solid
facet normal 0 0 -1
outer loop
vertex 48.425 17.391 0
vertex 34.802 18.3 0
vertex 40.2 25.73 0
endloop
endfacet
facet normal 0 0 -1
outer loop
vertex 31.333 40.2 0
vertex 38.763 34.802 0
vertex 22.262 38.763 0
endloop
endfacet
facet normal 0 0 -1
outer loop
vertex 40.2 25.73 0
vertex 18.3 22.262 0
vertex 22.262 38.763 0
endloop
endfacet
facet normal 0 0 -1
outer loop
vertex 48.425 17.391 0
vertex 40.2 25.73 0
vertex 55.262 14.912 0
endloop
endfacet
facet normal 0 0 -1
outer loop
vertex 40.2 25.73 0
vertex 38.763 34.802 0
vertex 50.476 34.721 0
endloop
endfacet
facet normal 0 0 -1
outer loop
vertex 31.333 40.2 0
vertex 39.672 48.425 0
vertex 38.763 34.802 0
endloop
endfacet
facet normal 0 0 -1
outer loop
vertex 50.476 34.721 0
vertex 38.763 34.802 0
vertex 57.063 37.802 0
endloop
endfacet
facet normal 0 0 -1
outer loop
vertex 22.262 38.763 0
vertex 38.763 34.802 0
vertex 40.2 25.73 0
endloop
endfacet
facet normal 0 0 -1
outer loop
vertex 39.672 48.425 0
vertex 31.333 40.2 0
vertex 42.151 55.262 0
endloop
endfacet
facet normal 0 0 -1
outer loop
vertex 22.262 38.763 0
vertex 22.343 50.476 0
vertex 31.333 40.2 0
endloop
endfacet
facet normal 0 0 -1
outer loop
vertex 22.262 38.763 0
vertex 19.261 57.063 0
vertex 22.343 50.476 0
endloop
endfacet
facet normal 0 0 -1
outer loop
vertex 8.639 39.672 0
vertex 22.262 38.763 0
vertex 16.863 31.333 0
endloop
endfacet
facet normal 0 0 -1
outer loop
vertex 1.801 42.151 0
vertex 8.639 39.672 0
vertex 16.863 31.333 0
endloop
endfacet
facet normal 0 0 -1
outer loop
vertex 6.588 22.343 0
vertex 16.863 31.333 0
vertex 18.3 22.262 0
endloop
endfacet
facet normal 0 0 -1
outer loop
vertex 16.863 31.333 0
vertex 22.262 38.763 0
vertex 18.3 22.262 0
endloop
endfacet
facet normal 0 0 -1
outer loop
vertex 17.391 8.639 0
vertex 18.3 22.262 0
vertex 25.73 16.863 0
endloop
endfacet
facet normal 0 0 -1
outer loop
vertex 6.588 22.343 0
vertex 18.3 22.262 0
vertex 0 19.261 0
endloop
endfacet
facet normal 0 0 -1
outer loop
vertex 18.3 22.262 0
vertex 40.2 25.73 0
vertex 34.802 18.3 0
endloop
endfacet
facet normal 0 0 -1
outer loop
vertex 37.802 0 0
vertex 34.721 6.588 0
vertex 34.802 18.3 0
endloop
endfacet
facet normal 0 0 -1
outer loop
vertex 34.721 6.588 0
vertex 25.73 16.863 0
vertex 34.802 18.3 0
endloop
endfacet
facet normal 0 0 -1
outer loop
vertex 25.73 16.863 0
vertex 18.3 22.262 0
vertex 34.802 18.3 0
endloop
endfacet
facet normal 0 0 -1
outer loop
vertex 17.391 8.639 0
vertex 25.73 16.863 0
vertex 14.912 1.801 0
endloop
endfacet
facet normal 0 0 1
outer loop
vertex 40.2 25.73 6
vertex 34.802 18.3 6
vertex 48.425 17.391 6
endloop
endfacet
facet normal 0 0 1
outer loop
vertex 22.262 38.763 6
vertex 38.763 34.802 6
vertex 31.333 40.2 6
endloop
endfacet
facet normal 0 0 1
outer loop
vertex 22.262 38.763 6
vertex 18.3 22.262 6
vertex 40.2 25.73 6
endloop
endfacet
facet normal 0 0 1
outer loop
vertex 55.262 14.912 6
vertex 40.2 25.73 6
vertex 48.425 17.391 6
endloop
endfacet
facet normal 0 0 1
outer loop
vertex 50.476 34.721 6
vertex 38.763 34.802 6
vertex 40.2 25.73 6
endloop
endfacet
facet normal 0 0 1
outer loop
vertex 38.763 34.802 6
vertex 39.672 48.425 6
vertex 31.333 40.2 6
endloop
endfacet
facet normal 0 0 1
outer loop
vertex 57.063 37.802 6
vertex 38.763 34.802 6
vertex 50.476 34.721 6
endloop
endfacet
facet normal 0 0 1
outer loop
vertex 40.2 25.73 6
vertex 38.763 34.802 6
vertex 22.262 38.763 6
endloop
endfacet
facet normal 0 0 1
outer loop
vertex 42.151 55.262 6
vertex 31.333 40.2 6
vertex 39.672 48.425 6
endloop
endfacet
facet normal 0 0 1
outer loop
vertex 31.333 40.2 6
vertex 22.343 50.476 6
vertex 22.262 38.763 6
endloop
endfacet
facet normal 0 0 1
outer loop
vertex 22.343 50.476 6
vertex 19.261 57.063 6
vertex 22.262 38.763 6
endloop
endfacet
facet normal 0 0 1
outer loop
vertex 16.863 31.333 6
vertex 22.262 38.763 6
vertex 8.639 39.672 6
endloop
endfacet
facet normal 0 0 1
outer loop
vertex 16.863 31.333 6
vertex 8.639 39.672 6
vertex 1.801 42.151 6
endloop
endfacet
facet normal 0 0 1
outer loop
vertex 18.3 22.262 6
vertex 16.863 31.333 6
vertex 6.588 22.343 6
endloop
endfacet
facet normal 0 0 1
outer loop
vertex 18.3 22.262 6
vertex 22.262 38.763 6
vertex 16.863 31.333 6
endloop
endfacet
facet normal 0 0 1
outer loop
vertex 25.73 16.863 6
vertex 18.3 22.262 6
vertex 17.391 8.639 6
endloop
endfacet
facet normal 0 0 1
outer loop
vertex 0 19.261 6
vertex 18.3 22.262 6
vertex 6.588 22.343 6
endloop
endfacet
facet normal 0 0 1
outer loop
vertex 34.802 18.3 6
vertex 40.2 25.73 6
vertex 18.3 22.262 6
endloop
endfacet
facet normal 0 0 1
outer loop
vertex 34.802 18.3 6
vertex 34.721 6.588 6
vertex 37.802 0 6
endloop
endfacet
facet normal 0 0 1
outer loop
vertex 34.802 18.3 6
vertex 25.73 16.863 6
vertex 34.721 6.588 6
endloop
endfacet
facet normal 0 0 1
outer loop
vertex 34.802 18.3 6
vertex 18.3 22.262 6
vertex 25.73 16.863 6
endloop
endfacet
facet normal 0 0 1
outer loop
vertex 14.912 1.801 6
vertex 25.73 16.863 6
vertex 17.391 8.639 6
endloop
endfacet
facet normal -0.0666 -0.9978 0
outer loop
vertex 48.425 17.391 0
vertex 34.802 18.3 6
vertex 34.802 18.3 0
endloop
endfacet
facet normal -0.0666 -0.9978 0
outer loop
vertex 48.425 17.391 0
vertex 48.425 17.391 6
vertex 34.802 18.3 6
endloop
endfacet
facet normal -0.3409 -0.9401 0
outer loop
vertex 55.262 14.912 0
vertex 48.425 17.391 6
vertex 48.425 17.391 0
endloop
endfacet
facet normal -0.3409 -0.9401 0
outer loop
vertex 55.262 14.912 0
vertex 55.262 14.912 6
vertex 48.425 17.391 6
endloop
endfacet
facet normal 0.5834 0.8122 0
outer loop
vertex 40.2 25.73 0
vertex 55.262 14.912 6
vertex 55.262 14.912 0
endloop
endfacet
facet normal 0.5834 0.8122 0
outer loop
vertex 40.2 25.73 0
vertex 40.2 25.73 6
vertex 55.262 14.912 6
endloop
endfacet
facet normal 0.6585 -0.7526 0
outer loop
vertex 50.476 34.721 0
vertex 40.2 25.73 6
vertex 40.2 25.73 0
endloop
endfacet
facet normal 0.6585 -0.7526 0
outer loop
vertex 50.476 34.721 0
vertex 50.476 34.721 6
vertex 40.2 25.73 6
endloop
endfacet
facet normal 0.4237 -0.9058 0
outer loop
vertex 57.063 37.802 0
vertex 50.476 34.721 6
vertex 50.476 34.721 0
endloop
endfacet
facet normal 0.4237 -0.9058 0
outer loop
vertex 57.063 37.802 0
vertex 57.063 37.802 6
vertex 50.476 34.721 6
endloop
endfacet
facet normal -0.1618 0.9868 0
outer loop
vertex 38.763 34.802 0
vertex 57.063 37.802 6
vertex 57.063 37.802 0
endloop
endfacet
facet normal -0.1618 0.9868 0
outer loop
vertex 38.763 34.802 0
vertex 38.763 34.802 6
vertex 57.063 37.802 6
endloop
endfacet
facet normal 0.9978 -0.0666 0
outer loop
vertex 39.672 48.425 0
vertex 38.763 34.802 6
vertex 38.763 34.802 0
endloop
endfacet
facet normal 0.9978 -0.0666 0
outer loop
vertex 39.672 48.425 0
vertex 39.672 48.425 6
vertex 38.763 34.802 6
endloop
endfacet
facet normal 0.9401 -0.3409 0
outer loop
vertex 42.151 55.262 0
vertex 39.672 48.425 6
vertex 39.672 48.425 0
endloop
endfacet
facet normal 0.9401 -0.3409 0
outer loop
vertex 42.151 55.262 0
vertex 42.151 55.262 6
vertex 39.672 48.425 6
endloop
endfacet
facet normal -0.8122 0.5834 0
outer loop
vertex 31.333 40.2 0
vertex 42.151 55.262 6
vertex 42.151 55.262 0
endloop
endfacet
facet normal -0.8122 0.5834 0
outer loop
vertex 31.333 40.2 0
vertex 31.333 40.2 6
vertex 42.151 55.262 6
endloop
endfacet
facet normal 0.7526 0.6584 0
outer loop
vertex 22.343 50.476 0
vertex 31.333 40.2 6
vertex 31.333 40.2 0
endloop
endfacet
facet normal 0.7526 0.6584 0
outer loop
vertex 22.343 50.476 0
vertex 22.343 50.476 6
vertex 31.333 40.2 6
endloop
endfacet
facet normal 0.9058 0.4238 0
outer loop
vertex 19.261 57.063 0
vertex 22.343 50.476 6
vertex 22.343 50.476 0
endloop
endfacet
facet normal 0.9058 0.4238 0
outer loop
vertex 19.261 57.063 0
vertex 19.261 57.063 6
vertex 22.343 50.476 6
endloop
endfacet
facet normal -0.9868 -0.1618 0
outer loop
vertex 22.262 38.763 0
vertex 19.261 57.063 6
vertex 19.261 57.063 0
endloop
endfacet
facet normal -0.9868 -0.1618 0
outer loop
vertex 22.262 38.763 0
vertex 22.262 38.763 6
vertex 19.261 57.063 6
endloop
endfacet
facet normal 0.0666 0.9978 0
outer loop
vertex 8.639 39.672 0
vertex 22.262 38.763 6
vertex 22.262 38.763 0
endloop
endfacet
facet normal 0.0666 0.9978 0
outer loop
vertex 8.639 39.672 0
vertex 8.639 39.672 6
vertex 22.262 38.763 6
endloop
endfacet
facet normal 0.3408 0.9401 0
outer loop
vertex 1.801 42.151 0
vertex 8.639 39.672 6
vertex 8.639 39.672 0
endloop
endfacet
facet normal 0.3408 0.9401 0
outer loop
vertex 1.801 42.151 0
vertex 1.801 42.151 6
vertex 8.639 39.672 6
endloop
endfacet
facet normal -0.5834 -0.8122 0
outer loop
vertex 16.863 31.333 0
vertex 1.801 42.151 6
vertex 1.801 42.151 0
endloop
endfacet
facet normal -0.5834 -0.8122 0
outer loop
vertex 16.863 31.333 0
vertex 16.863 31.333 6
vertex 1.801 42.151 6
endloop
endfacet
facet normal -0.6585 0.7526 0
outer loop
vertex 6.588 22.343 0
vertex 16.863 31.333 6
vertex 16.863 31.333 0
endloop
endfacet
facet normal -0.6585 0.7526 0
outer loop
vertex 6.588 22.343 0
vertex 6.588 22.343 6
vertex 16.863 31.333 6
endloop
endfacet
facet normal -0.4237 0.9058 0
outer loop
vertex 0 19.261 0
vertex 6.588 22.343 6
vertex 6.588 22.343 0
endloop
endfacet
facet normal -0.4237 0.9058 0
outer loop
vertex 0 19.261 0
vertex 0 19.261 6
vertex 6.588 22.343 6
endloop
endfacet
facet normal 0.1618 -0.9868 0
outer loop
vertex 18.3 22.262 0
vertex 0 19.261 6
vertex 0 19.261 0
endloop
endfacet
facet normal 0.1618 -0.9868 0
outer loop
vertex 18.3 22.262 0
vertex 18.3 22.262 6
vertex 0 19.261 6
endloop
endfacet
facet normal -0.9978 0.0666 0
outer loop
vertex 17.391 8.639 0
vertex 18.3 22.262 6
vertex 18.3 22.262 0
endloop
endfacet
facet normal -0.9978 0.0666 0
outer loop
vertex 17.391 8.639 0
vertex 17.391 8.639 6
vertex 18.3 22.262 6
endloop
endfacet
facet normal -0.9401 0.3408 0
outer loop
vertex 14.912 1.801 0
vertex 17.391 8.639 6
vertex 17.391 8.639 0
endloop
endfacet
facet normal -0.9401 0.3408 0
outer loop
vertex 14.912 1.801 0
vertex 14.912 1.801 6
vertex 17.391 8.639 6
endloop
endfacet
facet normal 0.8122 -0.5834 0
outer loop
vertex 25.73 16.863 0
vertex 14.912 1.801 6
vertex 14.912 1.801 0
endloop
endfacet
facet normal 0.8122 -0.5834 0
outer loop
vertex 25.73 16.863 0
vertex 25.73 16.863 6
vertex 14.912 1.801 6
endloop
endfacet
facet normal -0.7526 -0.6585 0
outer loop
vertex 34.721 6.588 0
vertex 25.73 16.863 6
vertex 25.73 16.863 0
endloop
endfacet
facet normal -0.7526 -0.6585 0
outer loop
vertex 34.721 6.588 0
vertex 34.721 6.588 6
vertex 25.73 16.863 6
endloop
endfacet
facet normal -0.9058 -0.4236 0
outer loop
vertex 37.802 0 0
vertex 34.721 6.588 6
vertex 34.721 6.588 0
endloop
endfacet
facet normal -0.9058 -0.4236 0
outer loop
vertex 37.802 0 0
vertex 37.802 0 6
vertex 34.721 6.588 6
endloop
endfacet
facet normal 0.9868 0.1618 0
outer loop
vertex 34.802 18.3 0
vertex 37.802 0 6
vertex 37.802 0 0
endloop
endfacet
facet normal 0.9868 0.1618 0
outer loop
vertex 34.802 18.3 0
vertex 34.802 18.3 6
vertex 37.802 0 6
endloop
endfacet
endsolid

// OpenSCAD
$fn = 32;

// ----------------------------------------------------------------------
// Fan rotor section: 8 blades, 12 mm hub radius, 18 mm blades
// ----------------------------------------------------------------------

// --- parameters (mm) ---
profile_height = 6;       // extrusion height
profile_points = 24;      // points of the closed outline

profile = [[40.2, 25.73], [50.476, 34.721], [57.063, 37.802], [38.763, 34.802], [39.672, 48.425], [42.151, 55.262], [31.333, 40.2], [22.343, 50.476], [19.261, 57.063], [22.262, 38.763], [8.639, 39.672], [1.801, 42.151], [16.863, 31.333], [6.588, 22.343], [0, 19.261], [18.3, 22.262], [17.391, 8.639], [14.912, 1.801], [25.73, 16.863], [34.721, 6.588], [37.802, 0], [34.802, 18.3], [48.425, 17.391], [55.262, 14.912]];  // single closed polygon, 24 points, counter clockwise

// --- the one profile operation ---
linear_extrude(height = profile_height) polygon(points = profile);
